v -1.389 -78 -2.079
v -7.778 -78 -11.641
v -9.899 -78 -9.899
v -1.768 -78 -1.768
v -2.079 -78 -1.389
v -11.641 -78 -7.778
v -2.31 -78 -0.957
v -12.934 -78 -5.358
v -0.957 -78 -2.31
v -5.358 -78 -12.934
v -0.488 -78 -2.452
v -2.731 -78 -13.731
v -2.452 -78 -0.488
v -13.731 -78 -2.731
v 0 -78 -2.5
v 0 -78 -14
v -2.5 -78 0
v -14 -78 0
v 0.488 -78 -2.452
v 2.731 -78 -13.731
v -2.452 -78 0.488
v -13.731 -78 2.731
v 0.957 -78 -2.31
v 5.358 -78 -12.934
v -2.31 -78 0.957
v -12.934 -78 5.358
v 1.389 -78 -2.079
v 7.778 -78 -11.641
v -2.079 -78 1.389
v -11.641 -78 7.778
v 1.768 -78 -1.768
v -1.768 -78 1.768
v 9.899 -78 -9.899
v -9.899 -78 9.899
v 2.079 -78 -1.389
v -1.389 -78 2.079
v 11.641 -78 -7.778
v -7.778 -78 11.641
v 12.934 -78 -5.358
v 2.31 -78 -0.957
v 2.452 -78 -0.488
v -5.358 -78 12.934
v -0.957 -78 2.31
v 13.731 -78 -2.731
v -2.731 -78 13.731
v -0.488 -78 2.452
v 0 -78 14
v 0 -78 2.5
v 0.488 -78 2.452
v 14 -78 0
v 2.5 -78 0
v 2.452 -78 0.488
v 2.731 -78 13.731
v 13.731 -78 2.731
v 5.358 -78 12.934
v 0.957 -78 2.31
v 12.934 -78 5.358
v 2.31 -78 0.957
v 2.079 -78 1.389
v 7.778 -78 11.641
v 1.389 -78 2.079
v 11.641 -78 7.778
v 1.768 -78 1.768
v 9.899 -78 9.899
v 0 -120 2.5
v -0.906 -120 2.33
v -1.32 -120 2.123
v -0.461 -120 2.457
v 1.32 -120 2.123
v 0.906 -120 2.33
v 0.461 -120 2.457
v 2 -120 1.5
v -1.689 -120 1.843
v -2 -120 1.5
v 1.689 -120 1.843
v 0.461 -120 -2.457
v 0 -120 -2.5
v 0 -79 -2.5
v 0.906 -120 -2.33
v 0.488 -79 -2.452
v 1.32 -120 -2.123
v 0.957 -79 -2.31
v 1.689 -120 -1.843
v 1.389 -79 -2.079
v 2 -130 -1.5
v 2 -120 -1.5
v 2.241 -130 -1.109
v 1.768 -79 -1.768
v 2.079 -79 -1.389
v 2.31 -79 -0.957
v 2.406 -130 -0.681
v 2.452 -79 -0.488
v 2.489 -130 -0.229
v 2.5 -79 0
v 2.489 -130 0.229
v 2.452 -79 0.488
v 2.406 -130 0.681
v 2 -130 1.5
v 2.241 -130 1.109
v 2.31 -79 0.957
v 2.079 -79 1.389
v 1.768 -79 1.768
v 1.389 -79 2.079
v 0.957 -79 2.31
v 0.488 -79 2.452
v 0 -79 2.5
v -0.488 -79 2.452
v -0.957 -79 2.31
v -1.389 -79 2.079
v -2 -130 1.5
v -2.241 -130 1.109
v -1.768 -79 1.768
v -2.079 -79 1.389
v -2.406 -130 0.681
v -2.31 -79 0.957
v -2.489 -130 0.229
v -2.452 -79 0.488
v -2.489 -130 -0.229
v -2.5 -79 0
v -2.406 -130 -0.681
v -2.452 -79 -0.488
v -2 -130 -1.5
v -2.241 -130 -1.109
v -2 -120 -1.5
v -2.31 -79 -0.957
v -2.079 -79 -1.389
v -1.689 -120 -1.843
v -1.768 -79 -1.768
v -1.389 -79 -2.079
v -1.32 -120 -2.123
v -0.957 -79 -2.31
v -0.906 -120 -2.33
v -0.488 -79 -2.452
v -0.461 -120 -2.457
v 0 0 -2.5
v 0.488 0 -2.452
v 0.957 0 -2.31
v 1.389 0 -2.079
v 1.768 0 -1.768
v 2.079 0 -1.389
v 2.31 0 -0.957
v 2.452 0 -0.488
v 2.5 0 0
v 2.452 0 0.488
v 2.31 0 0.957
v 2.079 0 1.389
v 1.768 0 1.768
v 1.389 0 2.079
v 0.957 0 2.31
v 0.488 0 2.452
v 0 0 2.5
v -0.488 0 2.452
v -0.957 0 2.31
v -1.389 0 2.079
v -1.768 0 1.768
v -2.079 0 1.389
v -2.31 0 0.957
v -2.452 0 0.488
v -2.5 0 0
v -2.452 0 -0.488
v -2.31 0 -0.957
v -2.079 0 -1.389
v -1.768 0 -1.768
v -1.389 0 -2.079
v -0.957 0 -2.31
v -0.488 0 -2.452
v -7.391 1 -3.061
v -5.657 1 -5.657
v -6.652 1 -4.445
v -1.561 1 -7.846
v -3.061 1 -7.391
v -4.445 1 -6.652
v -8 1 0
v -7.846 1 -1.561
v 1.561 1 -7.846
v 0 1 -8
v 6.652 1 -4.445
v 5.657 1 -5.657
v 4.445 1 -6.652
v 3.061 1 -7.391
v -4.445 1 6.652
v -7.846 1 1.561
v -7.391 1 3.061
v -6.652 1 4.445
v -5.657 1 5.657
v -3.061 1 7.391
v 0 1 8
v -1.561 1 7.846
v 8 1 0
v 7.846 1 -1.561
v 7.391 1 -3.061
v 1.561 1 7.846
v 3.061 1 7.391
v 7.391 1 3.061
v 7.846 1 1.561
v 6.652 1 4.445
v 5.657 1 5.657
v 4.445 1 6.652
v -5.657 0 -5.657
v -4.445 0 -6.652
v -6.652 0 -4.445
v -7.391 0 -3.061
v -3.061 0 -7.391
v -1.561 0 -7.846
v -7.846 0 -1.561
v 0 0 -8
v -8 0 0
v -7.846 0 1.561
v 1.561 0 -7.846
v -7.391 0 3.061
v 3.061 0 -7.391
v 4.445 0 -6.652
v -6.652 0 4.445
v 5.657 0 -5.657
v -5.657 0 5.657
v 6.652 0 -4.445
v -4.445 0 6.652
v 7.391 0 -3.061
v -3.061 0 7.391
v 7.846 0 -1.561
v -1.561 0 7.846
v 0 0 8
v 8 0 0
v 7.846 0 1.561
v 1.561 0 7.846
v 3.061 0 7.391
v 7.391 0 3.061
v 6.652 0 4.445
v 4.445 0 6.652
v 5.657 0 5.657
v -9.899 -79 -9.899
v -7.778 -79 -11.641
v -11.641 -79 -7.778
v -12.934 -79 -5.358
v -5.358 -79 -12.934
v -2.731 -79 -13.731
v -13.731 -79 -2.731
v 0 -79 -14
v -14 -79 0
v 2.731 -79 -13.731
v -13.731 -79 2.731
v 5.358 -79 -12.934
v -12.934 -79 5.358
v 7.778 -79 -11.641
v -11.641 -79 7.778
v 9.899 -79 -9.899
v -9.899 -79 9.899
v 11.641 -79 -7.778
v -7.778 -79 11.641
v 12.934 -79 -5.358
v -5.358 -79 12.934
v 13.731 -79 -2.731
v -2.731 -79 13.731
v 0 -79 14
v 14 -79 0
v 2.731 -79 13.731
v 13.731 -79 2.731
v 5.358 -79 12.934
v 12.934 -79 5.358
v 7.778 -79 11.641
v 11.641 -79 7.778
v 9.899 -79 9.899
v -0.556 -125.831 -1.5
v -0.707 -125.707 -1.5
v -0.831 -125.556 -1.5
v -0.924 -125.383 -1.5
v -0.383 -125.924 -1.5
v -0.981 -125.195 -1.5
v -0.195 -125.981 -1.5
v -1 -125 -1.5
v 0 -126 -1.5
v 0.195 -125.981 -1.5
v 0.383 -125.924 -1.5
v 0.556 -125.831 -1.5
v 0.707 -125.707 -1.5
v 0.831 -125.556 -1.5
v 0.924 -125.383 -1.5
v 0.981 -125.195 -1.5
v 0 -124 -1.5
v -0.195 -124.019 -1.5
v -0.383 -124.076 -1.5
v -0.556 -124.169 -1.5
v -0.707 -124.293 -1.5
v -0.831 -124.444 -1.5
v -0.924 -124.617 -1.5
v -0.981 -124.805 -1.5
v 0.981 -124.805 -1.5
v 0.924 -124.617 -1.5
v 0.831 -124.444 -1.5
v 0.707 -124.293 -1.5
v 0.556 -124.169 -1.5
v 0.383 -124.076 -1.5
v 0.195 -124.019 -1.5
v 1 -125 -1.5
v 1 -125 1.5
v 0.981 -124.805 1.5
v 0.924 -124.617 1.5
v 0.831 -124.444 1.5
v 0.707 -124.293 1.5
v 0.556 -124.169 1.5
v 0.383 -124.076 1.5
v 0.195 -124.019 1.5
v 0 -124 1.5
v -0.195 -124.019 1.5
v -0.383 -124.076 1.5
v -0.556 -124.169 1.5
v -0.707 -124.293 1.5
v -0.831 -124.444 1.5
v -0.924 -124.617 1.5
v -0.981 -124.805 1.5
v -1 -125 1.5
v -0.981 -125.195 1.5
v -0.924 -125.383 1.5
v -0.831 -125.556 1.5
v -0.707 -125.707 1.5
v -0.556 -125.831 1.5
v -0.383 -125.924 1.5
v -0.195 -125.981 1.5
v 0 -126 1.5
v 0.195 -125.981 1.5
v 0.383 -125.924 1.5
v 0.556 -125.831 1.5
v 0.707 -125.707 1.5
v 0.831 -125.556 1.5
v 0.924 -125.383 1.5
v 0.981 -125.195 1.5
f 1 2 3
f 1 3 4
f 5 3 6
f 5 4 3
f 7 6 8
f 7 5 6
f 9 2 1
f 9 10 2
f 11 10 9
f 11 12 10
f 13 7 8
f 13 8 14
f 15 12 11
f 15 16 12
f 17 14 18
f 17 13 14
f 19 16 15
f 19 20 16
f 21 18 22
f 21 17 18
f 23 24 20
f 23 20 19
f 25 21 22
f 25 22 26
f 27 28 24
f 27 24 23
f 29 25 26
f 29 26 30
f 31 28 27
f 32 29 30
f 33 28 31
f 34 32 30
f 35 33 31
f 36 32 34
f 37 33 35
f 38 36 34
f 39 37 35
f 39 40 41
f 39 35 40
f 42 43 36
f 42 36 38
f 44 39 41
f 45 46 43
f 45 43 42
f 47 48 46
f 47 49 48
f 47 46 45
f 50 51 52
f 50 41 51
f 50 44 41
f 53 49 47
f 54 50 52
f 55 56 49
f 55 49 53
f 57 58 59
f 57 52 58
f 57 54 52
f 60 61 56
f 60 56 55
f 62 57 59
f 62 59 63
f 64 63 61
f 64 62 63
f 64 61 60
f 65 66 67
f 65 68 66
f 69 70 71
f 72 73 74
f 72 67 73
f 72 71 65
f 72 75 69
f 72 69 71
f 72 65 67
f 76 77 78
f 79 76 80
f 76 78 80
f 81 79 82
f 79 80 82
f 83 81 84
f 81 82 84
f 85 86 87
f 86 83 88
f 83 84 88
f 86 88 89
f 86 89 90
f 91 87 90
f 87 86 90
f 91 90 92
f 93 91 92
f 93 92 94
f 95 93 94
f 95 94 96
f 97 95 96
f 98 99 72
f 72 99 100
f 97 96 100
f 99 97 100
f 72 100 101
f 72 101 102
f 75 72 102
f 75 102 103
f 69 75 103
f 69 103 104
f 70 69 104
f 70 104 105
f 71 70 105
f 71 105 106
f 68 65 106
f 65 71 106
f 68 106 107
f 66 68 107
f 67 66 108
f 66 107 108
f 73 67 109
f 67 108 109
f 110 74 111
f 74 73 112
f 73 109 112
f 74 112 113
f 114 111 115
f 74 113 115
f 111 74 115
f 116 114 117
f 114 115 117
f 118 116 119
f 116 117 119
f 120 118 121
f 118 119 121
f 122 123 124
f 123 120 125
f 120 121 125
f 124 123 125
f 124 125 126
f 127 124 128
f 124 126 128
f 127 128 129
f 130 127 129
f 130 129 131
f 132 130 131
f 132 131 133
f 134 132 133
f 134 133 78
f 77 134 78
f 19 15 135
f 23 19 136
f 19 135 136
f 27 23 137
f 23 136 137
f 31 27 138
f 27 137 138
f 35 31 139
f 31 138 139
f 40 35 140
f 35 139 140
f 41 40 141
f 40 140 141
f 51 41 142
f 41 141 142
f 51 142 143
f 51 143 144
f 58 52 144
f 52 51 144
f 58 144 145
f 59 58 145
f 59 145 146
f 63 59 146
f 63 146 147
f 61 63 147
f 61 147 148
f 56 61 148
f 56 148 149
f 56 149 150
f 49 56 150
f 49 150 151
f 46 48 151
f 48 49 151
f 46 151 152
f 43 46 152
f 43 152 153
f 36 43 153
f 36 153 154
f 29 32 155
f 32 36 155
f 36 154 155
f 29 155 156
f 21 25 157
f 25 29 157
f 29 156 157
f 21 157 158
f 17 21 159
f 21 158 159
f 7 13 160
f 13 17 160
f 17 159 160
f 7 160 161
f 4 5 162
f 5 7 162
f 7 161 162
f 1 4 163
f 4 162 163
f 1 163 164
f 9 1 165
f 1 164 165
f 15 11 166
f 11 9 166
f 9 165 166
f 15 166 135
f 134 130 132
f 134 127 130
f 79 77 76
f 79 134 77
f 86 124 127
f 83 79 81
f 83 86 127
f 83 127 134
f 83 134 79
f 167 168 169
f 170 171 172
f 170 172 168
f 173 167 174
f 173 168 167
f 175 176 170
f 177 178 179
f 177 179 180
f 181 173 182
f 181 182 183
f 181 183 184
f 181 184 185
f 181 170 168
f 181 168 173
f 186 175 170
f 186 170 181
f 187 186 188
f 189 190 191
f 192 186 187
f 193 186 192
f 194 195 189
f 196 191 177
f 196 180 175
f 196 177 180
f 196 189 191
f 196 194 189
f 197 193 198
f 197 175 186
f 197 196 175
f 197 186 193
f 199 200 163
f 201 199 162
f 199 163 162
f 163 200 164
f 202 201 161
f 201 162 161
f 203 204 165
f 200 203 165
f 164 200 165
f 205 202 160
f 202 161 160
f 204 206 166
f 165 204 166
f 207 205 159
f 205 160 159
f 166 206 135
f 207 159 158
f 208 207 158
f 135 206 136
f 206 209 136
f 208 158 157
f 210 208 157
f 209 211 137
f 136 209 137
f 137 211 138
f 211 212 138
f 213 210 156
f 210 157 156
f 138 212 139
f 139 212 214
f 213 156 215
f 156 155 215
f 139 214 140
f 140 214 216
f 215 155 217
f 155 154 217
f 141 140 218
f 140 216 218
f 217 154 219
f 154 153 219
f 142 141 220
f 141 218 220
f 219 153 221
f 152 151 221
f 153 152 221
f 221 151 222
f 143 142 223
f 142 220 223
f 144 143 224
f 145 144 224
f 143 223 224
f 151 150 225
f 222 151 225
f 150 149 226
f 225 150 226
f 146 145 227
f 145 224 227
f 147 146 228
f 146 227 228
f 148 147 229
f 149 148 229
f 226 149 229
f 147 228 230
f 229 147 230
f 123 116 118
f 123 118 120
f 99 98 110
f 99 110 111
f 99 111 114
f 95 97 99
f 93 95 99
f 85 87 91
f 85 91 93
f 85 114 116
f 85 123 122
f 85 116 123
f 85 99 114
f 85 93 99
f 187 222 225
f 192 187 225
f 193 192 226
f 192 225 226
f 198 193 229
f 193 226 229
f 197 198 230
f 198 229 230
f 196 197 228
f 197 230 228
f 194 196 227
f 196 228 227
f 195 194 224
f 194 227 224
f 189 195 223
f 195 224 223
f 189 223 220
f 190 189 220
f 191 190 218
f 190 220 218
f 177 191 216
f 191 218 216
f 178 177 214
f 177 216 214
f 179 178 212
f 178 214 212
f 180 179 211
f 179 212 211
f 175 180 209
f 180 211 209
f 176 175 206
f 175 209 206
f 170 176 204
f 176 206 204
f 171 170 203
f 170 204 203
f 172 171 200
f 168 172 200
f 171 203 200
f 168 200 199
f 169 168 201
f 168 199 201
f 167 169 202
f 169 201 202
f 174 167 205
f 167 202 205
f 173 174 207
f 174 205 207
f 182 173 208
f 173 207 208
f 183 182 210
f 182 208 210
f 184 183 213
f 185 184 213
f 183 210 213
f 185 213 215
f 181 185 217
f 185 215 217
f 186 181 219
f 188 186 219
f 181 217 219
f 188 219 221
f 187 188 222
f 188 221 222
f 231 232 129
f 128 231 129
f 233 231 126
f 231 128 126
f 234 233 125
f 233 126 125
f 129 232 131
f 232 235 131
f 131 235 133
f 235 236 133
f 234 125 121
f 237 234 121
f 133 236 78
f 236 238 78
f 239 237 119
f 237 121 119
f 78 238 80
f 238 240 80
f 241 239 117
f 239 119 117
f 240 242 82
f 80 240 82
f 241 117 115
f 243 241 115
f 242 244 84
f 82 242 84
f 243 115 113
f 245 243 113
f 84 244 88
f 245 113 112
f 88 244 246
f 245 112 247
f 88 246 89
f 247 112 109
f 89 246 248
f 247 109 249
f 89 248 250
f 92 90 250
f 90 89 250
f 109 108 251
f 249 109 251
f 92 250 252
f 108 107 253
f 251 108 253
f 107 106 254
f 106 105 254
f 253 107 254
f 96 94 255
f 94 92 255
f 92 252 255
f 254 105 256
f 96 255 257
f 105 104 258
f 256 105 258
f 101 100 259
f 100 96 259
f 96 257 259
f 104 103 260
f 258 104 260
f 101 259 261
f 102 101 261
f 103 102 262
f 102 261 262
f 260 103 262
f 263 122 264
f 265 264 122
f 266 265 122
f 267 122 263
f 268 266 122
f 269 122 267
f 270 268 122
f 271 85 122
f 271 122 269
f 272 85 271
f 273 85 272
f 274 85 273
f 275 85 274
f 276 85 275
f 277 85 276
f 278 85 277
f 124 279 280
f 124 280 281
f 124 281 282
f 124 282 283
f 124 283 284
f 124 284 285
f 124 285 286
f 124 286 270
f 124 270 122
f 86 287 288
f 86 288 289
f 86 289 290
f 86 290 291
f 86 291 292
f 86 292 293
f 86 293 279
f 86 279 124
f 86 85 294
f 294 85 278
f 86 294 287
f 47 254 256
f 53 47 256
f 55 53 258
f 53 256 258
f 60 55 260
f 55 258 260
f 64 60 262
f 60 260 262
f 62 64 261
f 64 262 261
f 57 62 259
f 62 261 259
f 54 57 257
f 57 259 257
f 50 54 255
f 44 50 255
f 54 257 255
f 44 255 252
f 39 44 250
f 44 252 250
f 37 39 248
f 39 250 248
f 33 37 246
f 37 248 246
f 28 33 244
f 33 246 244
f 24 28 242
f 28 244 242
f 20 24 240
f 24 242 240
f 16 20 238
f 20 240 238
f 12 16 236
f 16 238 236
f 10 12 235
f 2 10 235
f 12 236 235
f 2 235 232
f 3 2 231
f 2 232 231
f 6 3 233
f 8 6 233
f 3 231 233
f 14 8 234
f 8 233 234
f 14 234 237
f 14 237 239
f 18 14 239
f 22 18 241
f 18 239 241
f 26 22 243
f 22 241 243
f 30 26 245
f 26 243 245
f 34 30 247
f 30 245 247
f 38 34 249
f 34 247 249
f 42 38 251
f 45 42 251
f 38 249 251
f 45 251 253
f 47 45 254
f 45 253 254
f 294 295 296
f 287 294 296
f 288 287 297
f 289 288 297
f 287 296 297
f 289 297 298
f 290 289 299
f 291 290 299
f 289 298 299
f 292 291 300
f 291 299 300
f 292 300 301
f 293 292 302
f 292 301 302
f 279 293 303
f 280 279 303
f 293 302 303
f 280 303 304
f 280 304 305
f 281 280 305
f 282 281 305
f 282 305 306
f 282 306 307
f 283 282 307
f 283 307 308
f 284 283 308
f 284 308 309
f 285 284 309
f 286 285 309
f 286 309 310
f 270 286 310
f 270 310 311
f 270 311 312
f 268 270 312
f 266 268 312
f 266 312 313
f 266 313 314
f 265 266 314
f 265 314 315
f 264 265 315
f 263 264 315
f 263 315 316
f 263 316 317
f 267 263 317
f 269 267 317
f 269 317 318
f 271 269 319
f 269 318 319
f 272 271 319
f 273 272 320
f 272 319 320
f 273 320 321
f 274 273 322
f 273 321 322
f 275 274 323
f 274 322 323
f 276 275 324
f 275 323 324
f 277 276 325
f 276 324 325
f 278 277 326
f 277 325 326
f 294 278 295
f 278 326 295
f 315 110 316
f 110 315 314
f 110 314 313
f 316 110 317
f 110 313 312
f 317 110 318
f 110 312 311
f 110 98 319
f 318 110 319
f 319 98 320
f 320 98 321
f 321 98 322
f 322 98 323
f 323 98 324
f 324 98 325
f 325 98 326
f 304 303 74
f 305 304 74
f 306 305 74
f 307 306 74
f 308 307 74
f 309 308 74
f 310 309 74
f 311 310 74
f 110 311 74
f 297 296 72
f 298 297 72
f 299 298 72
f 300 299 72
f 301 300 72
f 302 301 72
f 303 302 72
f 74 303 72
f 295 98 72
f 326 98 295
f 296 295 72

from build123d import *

# Parameters (mm, degrees)
SKETCH_1_R          = 8
EXTRUDE_1_DEPTH     = 1
SKETCH_3_R          = 2.5
EXTRUDE_2_DEPTH     = 130
SKETCH_5_W          = 1
SKETCH_5_H          = 10
CUT_EXTRUDE_1_DEPTH = 131.668473627
SKETCH_6_R          = 1
CUT_EXTRUDE_2_DEPTH = 131.591921649
SKETCH_8_R          = 14
EXTRUDE_3_DEPTH     = 1


with BuildPart() as part:
    # 草图1 → 凸台-拉伸1 (new body)
    with BuildSketch(Plane(origin=(0, 0, 0), x_dir=(1, 0, 0), z_dir=(0, 1, 0))):
        with Locations(Location((0, 0, 0), (0, 0, 270))):
            Circle(SKETCH_1_R)
    extrude(amount=EXTRUDE_1_DEPTH)

    # 草图3 → 凸台-拉伸2 (add)
    with BuildSketch(Plane.XZ):
        with Locations(Location((0, 0, 0), (0, 0, 270))):
            Circle(SKETCH_3_R)
    extrude(amount=EXTRUDE_2_DEPTH)

    # 草图5 → 切除-拉伸1 (cut, through all)
    with BuildSketch(Plane(origin=(2.5, 0, 0), x_dir=(0, 0, -1), z_dir=(1, 0, 0))):
        with Locations((-2, -125)):
            Rectangle(SKETCH_5_W, SKETCH_5_H)
        with Locations((2, -125)):
            Rectangle(SKETCH_5_W, SKETCH_5_H)
    extrude(amount=-CUT_EXTRUDE_1_DEPTH, mode=Mode.SUBTRACT)

    # 草图6 → 切除-拉伸2 (cut, through all)
    with BuildSketch(Plane.XY.offset(1.5)):
        with Locations((0, -125)):
            Circle(SKETCH_6_R)
    extrude(amount=-CUT_EXTRUDE_2_DEPTH, mode=Mode.SUBTRACT)

    # 草图8 → 凸台-拉伸3 (add)
    with BuildSketch(Plane(origin=(0, -79, 0), x_dir=(1, 0, 0), z_dir=(0, 1, 0))):
        with Locations(Location((0, 0, 0), (0, 0, 270))):
            Circle(SKETCH_8_R)
    extrude(amount=EXTRUDE_3_DEPTH)


solid = part.part
